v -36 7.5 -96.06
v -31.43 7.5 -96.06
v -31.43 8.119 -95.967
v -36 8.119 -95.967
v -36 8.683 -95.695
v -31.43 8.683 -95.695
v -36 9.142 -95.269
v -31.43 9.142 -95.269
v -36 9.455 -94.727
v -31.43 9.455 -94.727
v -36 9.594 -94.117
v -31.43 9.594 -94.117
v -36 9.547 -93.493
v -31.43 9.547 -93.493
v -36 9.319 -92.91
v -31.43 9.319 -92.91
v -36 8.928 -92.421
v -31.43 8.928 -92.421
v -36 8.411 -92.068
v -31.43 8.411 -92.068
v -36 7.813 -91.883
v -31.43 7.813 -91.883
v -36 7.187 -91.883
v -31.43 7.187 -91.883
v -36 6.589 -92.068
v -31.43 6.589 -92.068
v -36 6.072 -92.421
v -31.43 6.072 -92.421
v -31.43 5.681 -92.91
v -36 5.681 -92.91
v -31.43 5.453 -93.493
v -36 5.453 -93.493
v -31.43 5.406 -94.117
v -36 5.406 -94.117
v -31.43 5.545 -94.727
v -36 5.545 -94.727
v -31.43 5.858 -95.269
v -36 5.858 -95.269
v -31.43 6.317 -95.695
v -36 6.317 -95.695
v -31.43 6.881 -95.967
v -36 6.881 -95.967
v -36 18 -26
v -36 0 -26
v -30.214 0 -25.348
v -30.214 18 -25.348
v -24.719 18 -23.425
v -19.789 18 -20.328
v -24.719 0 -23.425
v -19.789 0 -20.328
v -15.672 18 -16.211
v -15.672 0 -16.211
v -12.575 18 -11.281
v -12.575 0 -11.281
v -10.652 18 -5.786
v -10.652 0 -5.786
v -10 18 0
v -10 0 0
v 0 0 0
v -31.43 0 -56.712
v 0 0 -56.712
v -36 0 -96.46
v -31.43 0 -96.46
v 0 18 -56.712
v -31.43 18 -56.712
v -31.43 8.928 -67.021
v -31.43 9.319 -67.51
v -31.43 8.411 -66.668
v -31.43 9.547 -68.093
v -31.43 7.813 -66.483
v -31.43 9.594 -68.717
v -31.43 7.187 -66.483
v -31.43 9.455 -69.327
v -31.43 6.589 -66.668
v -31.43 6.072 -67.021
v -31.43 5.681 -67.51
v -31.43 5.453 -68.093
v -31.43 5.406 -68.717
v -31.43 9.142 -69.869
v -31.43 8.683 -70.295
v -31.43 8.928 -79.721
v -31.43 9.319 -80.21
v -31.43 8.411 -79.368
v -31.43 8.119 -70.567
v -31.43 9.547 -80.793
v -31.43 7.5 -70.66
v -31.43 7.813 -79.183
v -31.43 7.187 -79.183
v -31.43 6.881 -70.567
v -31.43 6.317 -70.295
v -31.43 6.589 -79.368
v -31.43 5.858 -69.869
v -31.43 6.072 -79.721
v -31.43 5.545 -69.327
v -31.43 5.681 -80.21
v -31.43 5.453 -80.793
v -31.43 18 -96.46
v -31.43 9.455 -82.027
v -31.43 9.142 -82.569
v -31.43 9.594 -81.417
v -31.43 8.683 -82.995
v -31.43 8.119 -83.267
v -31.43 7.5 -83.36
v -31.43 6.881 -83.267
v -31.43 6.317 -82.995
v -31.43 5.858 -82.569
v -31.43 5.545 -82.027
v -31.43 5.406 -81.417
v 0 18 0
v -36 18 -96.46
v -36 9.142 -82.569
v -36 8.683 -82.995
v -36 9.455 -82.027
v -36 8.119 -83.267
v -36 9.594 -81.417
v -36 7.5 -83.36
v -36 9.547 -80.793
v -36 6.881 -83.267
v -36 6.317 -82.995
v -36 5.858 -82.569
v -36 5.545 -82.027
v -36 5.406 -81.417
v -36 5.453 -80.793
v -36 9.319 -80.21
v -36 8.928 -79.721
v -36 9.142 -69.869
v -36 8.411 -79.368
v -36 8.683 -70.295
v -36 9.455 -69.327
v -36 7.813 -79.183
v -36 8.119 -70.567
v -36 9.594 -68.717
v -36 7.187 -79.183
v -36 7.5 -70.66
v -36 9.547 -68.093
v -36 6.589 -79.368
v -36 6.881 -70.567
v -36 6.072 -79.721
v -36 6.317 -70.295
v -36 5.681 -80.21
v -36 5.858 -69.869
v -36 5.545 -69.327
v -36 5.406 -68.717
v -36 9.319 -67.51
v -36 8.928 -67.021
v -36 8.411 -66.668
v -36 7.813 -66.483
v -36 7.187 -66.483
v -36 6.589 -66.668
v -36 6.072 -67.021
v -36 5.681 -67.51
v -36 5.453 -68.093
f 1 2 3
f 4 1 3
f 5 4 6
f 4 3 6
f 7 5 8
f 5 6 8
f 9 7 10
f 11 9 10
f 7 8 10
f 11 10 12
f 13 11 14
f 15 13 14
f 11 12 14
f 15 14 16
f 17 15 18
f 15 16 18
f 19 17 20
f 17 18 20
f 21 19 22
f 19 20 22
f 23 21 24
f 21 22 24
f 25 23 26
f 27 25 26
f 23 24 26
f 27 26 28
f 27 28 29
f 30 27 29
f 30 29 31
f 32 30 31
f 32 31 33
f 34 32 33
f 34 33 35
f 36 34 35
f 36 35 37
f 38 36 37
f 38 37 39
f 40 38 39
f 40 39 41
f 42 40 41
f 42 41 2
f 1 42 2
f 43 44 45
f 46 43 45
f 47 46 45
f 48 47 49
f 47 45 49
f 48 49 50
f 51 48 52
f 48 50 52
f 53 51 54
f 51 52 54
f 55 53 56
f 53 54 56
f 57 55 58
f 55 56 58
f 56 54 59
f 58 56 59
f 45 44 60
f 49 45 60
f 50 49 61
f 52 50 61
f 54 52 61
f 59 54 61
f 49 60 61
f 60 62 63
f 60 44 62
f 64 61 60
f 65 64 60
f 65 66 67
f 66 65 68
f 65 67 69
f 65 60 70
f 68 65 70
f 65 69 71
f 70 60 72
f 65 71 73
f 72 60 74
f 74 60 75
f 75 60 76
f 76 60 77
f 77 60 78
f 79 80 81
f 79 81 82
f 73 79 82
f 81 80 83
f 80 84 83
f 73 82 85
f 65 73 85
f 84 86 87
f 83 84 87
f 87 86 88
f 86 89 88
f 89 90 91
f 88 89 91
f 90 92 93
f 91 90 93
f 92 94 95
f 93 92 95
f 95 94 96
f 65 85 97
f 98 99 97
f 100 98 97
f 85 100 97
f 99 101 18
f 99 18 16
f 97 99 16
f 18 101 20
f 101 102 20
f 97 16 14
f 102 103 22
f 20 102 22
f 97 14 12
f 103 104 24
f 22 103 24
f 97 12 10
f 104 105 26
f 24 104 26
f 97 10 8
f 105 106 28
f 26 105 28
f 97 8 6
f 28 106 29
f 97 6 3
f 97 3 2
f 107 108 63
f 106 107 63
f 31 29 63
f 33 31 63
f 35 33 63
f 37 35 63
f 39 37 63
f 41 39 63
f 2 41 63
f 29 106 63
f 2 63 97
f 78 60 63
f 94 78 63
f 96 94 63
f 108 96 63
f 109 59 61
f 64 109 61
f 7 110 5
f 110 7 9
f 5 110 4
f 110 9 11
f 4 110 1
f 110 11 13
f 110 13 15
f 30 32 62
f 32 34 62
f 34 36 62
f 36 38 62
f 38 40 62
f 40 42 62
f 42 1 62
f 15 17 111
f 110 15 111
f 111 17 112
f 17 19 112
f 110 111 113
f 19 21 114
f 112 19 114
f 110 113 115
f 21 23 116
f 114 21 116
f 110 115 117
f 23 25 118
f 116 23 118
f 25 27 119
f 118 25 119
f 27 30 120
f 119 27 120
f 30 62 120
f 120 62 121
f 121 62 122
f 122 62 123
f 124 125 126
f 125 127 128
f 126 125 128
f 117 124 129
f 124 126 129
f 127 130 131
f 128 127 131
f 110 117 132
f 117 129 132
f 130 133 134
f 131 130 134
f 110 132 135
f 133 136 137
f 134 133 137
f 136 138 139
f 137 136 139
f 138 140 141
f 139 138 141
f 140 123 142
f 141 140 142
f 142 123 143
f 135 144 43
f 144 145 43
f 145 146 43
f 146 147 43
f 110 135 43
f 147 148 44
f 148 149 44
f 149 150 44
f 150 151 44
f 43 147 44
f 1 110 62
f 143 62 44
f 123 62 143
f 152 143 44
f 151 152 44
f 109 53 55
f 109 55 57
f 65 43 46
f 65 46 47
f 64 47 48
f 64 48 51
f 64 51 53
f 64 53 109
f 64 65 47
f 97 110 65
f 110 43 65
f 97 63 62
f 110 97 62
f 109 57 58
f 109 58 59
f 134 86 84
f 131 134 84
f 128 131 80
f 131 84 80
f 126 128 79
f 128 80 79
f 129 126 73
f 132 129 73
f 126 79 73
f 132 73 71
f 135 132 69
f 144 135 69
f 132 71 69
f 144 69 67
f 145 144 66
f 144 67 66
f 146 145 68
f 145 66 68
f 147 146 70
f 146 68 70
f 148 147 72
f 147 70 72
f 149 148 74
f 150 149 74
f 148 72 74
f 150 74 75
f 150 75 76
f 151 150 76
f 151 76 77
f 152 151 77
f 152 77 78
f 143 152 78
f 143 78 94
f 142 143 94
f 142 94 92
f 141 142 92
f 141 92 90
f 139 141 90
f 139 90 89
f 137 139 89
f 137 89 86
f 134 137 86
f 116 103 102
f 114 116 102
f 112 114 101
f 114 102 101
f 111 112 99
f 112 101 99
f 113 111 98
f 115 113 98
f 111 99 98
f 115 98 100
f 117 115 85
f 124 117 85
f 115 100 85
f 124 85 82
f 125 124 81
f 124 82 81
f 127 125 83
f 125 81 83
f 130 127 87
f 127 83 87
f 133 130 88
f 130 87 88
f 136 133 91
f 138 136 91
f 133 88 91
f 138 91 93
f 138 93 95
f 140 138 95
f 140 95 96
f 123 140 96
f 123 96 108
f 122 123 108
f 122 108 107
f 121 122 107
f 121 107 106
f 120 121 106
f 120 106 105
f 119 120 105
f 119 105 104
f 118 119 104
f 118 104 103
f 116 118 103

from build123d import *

# Parameters (mm, degrees)
BOSS_EXTRUDE1_DEPTH = 18
SKETCH4_R           = 2.1
CUT_EXTRUDE3_DEPTH  = 10


with BuildPart() as part:
    # Sketch1 → Boss-Extrude1 (new body)
    with BuildSketch(Plane(origin=(0, 0, 0), x_dir=(1, 0, 0), z_dir=(0, 1, 0))):
        with BuildLine():
            Line((-10, 0), (0, 0))
            Line((0, 0), (0, 56.712101031))
            Line((0, 56.712101031), (-31.43, 56.712101031))
            Line((-31.43, 56.712101031), (-31.43, 96.46))
            Line((-31.43, 96.46), (-36, 96.46))
            Line((-36, 96.46), (-36, 26))
            ThreePointArc((-36, 26), (-17.615223689, 18.384776311), (-10, 0))
        make_face()
    extrude(amount=BOSS_EXTRUDE1_DEPTH)

    # Sketch4 → Cut-Extrude3 (cut)
    with BuildSketch(Plane(origin=(-31.43, 0, 0), x_dir=(0, 0, -1), z_dir=(1, 0, 0))):
        with Locations((81.26, 7.5)):
            Circle(SKETCH4_R)
        with Locations((93.96, 7.5)):
            Circle(SKETCH4_R)
        with Locations((68.56, 7.5)):
            Circle(SKETCH4_R)
    extrude(amount=-CUT_EXTRUDE3_DEPTH, mode=Mode.SUBTRACT)


solid = part.part
